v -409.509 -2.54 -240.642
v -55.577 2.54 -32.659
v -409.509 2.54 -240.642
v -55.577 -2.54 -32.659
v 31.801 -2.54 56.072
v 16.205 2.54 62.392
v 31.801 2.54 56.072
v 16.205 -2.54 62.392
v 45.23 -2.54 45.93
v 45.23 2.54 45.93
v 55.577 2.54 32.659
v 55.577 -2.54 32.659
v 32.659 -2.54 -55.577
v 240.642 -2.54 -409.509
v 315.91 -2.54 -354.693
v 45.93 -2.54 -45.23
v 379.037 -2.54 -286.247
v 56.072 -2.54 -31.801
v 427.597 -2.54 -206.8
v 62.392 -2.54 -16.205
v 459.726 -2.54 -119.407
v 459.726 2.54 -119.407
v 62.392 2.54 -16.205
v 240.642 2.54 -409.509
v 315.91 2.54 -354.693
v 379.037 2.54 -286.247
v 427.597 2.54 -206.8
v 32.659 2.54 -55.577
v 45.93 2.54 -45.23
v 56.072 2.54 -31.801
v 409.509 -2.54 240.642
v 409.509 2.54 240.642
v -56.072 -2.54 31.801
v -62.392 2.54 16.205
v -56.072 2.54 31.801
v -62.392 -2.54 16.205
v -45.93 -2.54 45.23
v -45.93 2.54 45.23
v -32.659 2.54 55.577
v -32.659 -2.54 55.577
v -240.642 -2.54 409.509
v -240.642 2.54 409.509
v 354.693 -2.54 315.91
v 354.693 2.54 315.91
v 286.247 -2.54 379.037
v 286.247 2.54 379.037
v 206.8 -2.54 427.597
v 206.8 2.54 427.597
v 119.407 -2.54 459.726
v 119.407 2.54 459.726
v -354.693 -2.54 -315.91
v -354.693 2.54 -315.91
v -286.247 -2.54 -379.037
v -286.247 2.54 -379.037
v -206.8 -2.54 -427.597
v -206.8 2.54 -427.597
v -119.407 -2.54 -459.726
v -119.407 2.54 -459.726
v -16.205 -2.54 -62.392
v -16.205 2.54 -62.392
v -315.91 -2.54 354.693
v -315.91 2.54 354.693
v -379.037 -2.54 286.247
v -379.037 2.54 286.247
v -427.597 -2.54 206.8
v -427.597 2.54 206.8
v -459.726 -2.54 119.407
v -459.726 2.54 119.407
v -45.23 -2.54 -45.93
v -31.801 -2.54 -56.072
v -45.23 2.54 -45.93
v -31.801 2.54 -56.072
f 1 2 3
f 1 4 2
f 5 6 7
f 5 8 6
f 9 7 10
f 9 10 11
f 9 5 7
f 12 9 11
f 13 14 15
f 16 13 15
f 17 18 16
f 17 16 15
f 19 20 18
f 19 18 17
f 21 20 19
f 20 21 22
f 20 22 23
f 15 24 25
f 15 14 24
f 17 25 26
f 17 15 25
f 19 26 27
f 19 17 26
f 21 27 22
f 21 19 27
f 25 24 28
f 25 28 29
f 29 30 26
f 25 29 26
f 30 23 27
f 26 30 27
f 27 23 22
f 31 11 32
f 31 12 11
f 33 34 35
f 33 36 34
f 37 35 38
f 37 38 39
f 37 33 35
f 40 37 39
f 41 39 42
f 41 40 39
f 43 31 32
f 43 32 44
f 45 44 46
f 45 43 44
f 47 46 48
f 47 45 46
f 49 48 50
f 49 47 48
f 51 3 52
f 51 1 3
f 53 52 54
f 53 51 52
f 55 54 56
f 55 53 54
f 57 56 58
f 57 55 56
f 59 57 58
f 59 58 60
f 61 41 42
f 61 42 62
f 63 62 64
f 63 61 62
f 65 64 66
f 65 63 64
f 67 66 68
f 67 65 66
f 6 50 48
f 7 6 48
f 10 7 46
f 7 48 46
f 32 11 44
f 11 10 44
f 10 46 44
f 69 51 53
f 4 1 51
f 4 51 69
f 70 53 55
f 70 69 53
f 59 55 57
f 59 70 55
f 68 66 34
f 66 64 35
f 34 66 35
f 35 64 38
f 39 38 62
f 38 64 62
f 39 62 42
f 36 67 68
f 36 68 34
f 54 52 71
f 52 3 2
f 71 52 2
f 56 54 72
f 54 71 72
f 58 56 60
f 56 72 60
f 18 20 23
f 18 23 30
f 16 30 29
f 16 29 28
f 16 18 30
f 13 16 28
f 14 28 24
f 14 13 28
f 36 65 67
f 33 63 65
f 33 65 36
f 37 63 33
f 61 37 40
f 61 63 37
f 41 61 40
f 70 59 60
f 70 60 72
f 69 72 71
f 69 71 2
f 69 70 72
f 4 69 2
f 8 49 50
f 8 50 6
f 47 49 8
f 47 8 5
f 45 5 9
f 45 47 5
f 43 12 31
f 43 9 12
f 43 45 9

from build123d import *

# Parameters (mm, degrees)
F3_DEPTH = 2.54


with BuildPart() as f3:
    # F0 (on Front) → F3 (new body, symmetric)
    with BuildSketch(Plane.XZ):
        with BuildLine():
            Line((55.5766792975, 32.6588840608), (409.5086387626, 240.6422140416))
            ThreePointArc((409.5086387626, 240.6422140416), (286.2468612979, 379.036587676), (119.4065940349, 459.726076812))
            Line((119.4065940349, 459.726076812), (16.2053284217, 62.3919651925))
            ThreePointArc((16.2053284217, 62.3919651925), (38.8481426383, 51.4411489314), (55.5766792975, 32.6588840608))
        make_face()
    extrude(amount=F3_DEPTH, both=True)


with BuildPart() as f3b:
    # F0 (on Front) → F3, piece 2 (new body, symmetric)
    with BuildSketch(Plane.XZ):
        with BuildLine():
            Line((-32.6588840608, 55.5766792975), (-240.6422140416, 409.5086387626))
            ThreePointArc((-240.6422140416, 409.5086387626), (-379.036587676, 286.2468612979), (-459.726076812, 119.4065940349))
            Line((-459.726076812, 119.4065940349), (-62.3919651925, 16.2053284217))
            ThreePointArc((-62.3919651925, 16.2053284217), (-51.4411489314, 38.8481426383), (-32.6588840608, 55.5766792975))
        make_face()
    extrude(amount=F3_DEPTH, both=True)


with BuildPart() as f3c:
    # F0 (on Front) → F3, piece 3 (new body, symmetric)
    with BuildSketch(Plane.XZ):
        with BuildLine():
            ThreePointArc((-409.5086387626, -240.6422140416), (-286.2468612979, -379.036587676), (-119.4065940349, -459.726076812))
            Line((-119.4065940349, -459.726076812), (-16.2053284217, -62.3919651925))
            ThreePointArc((-16.2053284217, -62.3919651925), (-38.8481426383, -51.4411489314), (-55.5766792975, -32.6588840608))
            Line((-55.5766792975, -32.6588840608), (-409.5086387626, -240.6422140416))
        make_face()
    extrude(amount=F3_DEPTH, both=True)


with BuildPart() as f3d:
    # F0 (on Front) → F3, piece 4 (new body, symmetric)
    with BuildSketch(Plane.XZ):
        with BuildLine():
            ThreePointArc((240.6422140416, -409.5086387626), (379.036587676, -286.2468612979), (459.726076812, -119.4065940349))
            Line((459.726076812, -119.4065940349), (62.3919651925, -16.2053284217))
            ThreePointArc((62.3919651925, -16.2053284217), (51.4411489314, -38.8481426383), (32.6588840608, -55.5766792975))
            Line((32.6588840608, -55.5766792975), (240.6422140416, -409.5086387626))
        make_face()
    extrude(amount=F3_DEPTH, both=True)


solid = Compound([f3.part, f3b.part, f3c.part, f3d.part])
